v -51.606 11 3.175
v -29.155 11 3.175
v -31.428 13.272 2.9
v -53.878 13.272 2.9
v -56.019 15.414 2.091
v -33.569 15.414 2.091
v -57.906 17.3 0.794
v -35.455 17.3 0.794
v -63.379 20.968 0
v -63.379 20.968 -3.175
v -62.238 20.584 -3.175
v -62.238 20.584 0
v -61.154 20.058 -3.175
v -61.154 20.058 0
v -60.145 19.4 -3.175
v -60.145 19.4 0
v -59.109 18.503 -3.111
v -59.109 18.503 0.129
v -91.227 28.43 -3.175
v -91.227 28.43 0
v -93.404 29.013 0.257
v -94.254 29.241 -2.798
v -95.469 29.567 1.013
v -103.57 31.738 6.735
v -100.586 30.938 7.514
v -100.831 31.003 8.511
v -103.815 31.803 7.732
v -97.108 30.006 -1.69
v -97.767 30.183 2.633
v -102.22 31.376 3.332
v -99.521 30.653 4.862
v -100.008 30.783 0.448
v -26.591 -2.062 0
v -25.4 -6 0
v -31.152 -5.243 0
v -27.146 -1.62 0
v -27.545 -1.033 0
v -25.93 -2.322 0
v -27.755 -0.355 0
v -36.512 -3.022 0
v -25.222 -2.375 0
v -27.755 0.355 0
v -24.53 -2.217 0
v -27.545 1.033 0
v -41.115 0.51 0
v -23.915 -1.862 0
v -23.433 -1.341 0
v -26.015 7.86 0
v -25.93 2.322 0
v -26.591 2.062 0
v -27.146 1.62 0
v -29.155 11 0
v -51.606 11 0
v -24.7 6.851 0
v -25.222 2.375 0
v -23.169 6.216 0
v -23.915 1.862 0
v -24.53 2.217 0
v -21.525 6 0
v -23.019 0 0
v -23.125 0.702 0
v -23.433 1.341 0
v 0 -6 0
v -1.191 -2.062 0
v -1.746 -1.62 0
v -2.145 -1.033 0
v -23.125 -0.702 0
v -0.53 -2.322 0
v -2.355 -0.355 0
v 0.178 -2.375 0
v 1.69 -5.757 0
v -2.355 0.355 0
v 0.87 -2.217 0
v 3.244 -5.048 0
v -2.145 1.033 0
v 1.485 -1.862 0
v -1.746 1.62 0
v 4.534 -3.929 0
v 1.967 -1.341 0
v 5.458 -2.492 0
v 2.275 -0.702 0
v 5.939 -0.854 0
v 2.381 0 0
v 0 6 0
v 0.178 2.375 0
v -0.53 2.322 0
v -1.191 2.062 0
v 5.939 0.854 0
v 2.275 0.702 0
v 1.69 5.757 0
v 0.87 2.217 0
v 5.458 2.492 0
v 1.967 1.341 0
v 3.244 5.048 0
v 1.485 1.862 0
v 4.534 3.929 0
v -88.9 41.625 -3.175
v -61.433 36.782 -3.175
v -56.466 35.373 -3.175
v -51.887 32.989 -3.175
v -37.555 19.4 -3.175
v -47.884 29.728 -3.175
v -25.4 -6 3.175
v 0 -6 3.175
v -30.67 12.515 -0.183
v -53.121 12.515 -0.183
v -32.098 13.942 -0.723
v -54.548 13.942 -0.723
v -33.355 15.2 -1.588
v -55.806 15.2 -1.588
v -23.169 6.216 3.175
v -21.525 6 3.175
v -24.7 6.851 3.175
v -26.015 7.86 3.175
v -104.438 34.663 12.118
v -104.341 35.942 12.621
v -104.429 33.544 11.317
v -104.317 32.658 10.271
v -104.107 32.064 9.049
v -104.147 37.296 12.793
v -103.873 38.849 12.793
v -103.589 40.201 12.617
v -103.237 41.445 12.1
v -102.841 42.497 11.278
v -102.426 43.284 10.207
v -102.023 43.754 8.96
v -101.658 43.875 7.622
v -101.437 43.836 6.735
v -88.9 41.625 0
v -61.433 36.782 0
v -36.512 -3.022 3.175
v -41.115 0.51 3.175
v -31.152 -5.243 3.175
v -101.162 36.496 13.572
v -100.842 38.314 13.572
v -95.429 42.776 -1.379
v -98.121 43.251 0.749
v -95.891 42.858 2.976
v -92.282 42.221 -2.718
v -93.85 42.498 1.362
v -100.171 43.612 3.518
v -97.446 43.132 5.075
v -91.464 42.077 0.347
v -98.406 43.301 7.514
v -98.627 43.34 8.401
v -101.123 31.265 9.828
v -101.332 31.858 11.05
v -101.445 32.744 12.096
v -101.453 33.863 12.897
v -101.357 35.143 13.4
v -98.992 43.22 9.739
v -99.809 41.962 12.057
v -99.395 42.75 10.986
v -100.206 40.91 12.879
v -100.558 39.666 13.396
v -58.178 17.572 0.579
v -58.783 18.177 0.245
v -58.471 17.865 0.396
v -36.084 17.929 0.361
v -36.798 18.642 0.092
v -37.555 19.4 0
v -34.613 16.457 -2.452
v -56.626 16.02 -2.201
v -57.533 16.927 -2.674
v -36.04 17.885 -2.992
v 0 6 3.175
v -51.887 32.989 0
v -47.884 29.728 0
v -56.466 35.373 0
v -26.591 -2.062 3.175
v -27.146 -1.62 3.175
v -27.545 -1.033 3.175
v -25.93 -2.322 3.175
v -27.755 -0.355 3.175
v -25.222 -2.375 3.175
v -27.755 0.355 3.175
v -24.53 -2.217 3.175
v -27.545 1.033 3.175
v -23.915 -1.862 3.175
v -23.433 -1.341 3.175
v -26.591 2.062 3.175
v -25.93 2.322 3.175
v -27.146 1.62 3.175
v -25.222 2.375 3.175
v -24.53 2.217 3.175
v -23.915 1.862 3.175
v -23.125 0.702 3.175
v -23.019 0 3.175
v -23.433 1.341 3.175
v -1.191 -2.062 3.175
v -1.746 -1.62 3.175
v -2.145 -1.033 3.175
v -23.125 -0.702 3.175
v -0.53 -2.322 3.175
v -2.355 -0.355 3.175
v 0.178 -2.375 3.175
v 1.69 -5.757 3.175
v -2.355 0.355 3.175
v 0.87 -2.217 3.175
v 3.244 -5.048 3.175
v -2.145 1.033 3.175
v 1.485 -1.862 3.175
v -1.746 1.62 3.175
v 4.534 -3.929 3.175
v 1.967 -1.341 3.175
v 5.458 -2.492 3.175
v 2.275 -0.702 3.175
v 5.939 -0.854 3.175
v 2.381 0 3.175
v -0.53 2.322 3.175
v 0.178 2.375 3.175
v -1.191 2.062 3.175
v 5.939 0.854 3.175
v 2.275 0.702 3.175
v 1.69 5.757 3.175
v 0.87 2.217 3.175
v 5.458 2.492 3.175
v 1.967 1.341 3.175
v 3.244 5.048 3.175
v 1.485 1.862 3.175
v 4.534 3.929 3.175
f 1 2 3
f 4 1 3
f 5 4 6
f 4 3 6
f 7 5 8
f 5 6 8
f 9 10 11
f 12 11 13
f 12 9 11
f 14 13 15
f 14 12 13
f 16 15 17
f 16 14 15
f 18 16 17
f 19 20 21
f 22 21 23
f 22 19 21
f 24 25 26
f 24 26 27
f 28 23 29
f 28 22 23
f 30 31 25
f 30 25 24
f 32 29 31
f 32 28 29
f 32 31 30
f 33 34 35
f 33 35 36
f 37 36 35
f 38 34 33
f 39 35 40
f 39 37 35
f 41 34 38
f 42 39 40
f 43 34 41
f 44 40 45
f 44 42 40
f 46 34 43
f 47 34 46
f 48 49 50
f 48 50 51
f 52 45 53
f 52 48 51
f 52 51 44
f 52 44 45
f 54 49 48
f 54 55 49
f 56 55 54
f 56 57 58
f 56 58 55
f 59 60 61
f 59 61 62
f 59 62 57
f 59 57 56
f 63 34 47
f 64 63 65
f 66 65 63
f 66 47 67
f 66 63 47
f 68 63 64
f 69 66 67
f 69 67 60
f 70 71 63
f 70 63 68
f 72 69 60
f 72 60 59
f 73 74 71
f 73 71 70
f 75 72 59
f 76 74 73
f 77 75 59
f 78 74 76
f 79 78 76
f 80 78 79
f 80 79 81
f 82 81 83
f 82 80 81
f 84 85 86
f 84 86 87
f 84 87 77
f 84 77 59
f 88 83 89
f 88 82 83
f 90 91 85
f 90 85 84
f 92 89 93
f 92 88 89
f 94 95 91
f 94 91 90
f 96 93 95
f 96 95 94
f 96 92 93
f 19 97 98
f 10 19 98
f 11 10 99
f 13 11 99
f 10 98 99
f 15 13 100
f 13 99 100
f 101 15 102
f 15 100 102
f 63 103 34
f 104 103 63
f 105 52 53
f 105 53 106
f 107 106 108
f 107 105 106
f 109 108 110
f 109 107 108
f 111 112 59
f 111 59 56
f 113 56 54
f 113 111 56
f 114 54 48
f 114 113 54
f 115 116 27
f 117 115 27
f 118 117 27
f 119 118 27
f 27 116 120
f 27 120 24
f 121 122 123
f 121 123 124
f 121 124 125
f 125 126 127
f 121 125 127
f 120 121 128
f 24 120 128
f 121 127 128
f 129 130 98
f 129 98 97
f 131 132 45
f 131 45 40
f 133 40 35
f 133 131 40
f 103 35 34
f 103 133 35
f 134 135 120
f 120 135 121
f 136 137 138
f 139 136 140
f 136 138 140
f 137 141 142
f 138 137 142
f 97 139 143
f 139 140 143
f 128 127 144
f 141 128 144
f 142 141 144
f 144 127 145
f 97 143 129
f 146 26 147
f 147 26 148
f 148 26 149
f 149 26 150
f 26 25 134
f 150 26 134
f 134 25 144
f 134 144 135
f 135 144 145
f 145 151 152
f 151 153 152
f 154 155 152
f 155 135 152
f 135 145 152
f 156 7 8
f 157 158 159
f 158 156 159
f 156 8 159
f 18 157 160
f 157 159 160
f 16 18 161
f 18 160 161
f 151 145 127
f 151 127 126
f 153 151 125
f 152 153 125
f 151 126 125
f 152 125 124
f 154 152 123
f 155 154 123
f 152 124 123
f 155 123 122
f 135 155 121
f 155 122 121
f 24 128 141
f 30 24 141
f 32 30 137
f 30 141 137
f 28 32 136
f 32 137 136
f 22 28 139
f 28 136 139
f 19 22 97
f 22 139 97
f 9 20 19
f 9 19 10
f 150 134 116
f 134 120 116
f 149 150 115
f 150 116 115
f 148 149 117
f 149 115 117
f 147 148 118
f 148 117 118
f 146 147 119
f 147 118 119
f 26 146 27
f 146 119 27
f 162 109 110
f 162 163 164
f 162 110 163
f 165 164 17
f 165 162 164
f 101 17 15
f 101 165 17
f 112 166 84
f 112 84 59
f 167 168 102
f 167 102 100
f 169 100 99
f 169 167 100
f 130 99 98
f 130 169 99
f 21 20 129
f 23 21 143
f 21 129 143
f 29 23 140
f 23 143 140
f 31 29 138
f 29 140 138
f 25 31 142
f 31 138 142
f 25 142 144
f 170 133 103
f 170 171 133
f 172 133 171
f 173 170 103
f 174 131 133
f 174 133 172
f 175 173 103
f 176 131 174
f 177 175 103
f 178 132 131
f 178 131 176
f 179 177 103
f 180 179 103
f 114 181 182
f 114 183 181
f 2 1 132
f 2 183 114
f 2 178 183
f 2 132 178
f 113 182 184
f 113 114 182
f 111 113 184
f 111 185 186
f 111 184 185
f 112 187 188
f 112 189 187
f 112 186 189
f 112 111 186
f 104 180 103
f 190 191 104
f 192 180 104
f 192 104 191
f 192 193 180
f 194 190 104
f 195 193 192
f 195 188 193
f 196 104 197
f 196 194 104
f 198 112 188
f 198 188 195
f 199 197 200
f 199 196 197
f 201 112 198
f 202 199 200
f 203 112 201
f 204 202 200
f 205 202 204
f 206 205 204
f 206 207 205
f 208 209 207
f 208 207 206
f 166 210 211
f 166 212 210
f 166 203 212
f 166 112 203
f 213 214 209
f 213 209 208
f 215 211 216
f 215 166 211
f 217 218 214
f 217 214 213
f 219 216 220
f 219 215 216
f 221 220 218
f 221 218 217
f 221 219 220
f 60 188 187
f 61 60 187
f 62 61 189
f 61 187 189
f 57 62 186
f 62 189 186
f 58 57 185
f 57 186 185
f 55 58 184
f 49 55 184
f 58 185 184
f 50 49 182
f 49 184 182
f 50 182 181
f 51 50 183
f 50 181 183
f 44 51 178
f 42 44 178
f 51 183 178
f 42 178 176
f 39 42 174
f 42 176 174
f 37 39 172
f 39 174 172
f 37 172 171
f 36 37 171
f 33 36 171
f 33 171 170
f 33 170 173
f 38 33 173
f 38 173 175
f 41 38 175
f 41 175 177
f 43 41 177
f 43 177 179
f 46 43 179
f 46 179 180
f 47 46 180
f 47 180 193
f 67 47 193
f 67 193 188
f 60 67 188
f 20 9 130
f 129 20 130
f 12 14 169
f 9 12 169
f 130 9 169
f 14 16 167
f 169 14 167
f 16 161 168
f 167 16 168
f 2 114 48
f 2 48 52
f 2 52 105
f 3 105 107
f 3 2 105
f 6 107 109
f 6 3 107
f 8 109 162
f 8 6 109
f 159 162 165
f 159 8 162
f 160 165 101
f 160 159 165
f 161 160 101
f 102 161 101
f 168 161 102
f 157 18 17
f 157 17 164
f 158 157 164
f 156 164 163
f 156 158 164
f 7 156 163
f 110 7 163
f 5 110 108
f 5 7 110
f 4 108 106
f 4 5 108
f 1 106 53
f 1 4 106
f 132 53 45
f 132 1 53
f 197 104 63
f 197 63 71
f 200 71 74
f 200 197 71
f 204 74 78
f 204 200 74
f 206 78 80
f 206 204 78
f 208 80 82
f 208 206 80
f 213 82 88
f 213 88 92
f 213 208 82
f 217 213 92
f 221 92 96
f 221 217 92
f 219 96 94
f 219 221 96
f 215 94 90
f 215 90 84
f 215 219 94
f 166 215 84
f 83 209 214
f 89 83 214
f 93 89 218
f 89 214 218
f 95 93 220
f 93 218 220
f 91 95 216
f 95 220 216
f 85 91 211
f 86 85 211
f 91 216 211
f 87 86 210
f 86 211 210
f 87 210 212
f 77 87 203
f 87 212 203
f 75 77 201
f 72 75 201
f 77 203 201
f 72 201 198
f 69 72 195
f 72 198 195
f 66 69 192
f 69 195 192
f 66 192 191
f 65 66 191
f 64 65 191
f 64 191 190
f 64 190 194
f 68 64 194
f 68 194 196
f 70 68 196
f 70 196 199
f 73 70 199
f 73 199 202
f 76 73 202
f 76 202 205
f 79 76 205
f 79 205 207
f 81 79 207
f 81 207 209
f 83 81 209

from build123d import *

# Parameters (mm, degrees)
BASE_EXTRUDE_DEPTH      = 3.175
CUT_EXTRUDE1_DEPTH      = 101.324569797
CUT_EXTRUDE1_DEPTH_BACK = 101.324569797
CUT_EXTRUDE2_DEPTH      = 101.3245698
SKETCH4_R               = 2.38125
CUT_EXTRUDE3_DEPTH      = 101.47517694
BOSS_EXTRUDE1_REACH     = 102.663
FILLET4_R               = 5.334


with BuildPart() as part:
    # Sketch1 → Base-Extrude (new, symmetric)
    with BuildSketch(Plane.XY):
        with BuildLine():
            Line((0, 6), (-21.525, 6))
            ThreePointArc((-21.525, 6), (-23.955039796, 6.483364969), (-26.015128061, 7.859871939))
            Line((-26.015128061, 7.859871939), (-47.883548214, 29.728292093))
            ThreePointArc((-47.883548214, 29.728292093), (-54.11564568, 34.297855014), (-61.433396744, 36.781896777))
            Line((-61.433396744, 36.781896777), (-88.9, 41.625))
            Line((-88.9, 41.625), (-91.226630185, 28.43002453))
            Line((-91.226630185, 28.43002453), (-63.378809052, 20.968223346))
            ThreePointArc((-63.378809052, 20.968223346), (-61.081560456, 20.016671822), (-59.108868366, 18.502971942))
            Line((-59.108868366, 18.502971942), (-41.115448212, 0.509551788))
            ThreePointArc((-41.115448212, 0.509551788), (-33.905139284, -4.30822261), (-25.4, -6))
            Line((-25.4, -6), (0, -6))
            ThreePointArc((0, -6), (6, 0), (0, 6))
        make_face()
    extrude(amount=BASE_EXTRUDE_DEPTH, both=True)

    # Sketch2 → Cut-Extrude1 (cut, two sides)
    with BuildSketch(Plane(origin=(0, 0, 0), x_dir=(0, 0, -1), z_dir=(1, 0, 0))) as cut_extrude1_sk:
        with BuildLine():
            Line((109.267936785, -6), (3.175, -6))
            Line((3.175, -6), (0, -6))
            Line((0, -6), (0, 10.999739587))
            ThreePointArc((0, 10.999739587), (0.410118898, 13.244803618), (1.5875, 15.199869794))
            ThreePointArc((1.5875, 15.199869794), (2.764881102, 17.15493597), (3.175, 19.4))
            Line((3.175, 19.4), (3.175, 125.492936785))
            Line((3.175, 125.492936785), (168.312411522, 258.731370649))
            Line((168.312411522, 258.731370649), (274.405348307, 127.238433864))
            Line((274.405348307, 127.238433864), (109.267936785, -6))
        make_face()
    extrude(amount=CUT_EXTRUDE1_DEPTH, mode=Mode.SUBTRACT)
    extrude(cut_extrude1_sk.sketch, amount=-CUT_EXTRUDE1_DEPTH_BACK, mode=Mode.SUBTRACT)

    # Sketch3 → Cut-Extrude2 (cut, through all)
    with BuildSketch(Plane(origin=(0, 0, 0), x_dir=(0, 0, -1), z_dir=(1, 0, 0))):
        with BuildLine():
            Line((0, 19.4), (0, 41.625))
            Line((0, 41.625), (-3.175, 41.625))
            Line((-3.175, 41.625), (-3.175, 10.999739587))
            ThreePointArc((-3.175, 10.999739587), (-2.559821652, 14.367335633), (-0.79375, 17.299934897))
            ThreePointArc((-0.79375, 17.299934897), (-0.205059449, 18.277467985), (0, 19.4))
        make_face()
    extrude(amount=-CUT_EXTRUDE2_DEPTH, mode=Mode.SUBTRACT)

    # Sketch4 → Cut-Extrude3 (cut, through all)
    with BuildSketch(Plane.XY.offset(3.175)):
        Circle(SKETCH4_R)
        with Locations((-25.4, 0)):
            Circle(SKETCH4_R)
    extrude(amount=-CUT_EXTRUDE3_DEPTH, mode=Mode.SUBTRACT)

    # Boss-Extrude1: up to this plane
    boss_extrude1_end = Plane(origin=(-63.378809052, 20.968223346, 3.175), z_dir=(-0.2588190451025212, -0.9659258262890683, 0))
    # Sketch6 → Boss-Extrude1 (add, up to the surface)
    with BuildSketch(Plane(origin=(4.437631227, 25.167057299, 0), x_dir=(-0.9848077530122081, 0.1736481776669304, 0), z_dir=(0.17364817766693036, 0.984807753012208, 0)), mode=Mode.PRIVATE) as boss_extrude1_sk1:
        with BuildLine():
            Line((94.777514638, -3.175), (94.777514638, 0))
            ThreePointArc((94.777514638, 0), (100.893829519, 2.100047584), (104.430088098, 7.51432342))
            Line((104.430088098, 7.51432342), (105.962866768, 13.571805745))
            Line((105.962866768, 13.571805745), (109.040855754, 12.792954794))
            Line((109.040855754, 12.792954794), (107.508077084, 6.73547247))
            ThreePointArc((107.508077084, 6.73547247), (102.844185029, -0.405294385), (94.777514638, -3.175))
        make_face()
    boss_extrude1_tool1 = split(extrude(boss_extrude1_sk1.sketch, amount=-BOSS_EXTRUDE1_REACH, mode=Mode.PRIVATE), bisect_by=boss_extrude1_end, keep=Keep.BOTH, mode=Mode.PRIVATE)
    add(boss_extrude1_tool1.solids().sort_by_distance((-96.950625, 43.044542, 3.972737))[0])

    # Fillet4
    fillet4_edges = [part.edges().sort_by_distance(p)[0] for p in [
        (-103.564353975, 31.735907656, 13.182380269),
        (-101.431035206, 43.834559603, 13.182380269),
    ]]
    fillet(fillet4_edges, radius=FILLET4_R)


solid = part.part
